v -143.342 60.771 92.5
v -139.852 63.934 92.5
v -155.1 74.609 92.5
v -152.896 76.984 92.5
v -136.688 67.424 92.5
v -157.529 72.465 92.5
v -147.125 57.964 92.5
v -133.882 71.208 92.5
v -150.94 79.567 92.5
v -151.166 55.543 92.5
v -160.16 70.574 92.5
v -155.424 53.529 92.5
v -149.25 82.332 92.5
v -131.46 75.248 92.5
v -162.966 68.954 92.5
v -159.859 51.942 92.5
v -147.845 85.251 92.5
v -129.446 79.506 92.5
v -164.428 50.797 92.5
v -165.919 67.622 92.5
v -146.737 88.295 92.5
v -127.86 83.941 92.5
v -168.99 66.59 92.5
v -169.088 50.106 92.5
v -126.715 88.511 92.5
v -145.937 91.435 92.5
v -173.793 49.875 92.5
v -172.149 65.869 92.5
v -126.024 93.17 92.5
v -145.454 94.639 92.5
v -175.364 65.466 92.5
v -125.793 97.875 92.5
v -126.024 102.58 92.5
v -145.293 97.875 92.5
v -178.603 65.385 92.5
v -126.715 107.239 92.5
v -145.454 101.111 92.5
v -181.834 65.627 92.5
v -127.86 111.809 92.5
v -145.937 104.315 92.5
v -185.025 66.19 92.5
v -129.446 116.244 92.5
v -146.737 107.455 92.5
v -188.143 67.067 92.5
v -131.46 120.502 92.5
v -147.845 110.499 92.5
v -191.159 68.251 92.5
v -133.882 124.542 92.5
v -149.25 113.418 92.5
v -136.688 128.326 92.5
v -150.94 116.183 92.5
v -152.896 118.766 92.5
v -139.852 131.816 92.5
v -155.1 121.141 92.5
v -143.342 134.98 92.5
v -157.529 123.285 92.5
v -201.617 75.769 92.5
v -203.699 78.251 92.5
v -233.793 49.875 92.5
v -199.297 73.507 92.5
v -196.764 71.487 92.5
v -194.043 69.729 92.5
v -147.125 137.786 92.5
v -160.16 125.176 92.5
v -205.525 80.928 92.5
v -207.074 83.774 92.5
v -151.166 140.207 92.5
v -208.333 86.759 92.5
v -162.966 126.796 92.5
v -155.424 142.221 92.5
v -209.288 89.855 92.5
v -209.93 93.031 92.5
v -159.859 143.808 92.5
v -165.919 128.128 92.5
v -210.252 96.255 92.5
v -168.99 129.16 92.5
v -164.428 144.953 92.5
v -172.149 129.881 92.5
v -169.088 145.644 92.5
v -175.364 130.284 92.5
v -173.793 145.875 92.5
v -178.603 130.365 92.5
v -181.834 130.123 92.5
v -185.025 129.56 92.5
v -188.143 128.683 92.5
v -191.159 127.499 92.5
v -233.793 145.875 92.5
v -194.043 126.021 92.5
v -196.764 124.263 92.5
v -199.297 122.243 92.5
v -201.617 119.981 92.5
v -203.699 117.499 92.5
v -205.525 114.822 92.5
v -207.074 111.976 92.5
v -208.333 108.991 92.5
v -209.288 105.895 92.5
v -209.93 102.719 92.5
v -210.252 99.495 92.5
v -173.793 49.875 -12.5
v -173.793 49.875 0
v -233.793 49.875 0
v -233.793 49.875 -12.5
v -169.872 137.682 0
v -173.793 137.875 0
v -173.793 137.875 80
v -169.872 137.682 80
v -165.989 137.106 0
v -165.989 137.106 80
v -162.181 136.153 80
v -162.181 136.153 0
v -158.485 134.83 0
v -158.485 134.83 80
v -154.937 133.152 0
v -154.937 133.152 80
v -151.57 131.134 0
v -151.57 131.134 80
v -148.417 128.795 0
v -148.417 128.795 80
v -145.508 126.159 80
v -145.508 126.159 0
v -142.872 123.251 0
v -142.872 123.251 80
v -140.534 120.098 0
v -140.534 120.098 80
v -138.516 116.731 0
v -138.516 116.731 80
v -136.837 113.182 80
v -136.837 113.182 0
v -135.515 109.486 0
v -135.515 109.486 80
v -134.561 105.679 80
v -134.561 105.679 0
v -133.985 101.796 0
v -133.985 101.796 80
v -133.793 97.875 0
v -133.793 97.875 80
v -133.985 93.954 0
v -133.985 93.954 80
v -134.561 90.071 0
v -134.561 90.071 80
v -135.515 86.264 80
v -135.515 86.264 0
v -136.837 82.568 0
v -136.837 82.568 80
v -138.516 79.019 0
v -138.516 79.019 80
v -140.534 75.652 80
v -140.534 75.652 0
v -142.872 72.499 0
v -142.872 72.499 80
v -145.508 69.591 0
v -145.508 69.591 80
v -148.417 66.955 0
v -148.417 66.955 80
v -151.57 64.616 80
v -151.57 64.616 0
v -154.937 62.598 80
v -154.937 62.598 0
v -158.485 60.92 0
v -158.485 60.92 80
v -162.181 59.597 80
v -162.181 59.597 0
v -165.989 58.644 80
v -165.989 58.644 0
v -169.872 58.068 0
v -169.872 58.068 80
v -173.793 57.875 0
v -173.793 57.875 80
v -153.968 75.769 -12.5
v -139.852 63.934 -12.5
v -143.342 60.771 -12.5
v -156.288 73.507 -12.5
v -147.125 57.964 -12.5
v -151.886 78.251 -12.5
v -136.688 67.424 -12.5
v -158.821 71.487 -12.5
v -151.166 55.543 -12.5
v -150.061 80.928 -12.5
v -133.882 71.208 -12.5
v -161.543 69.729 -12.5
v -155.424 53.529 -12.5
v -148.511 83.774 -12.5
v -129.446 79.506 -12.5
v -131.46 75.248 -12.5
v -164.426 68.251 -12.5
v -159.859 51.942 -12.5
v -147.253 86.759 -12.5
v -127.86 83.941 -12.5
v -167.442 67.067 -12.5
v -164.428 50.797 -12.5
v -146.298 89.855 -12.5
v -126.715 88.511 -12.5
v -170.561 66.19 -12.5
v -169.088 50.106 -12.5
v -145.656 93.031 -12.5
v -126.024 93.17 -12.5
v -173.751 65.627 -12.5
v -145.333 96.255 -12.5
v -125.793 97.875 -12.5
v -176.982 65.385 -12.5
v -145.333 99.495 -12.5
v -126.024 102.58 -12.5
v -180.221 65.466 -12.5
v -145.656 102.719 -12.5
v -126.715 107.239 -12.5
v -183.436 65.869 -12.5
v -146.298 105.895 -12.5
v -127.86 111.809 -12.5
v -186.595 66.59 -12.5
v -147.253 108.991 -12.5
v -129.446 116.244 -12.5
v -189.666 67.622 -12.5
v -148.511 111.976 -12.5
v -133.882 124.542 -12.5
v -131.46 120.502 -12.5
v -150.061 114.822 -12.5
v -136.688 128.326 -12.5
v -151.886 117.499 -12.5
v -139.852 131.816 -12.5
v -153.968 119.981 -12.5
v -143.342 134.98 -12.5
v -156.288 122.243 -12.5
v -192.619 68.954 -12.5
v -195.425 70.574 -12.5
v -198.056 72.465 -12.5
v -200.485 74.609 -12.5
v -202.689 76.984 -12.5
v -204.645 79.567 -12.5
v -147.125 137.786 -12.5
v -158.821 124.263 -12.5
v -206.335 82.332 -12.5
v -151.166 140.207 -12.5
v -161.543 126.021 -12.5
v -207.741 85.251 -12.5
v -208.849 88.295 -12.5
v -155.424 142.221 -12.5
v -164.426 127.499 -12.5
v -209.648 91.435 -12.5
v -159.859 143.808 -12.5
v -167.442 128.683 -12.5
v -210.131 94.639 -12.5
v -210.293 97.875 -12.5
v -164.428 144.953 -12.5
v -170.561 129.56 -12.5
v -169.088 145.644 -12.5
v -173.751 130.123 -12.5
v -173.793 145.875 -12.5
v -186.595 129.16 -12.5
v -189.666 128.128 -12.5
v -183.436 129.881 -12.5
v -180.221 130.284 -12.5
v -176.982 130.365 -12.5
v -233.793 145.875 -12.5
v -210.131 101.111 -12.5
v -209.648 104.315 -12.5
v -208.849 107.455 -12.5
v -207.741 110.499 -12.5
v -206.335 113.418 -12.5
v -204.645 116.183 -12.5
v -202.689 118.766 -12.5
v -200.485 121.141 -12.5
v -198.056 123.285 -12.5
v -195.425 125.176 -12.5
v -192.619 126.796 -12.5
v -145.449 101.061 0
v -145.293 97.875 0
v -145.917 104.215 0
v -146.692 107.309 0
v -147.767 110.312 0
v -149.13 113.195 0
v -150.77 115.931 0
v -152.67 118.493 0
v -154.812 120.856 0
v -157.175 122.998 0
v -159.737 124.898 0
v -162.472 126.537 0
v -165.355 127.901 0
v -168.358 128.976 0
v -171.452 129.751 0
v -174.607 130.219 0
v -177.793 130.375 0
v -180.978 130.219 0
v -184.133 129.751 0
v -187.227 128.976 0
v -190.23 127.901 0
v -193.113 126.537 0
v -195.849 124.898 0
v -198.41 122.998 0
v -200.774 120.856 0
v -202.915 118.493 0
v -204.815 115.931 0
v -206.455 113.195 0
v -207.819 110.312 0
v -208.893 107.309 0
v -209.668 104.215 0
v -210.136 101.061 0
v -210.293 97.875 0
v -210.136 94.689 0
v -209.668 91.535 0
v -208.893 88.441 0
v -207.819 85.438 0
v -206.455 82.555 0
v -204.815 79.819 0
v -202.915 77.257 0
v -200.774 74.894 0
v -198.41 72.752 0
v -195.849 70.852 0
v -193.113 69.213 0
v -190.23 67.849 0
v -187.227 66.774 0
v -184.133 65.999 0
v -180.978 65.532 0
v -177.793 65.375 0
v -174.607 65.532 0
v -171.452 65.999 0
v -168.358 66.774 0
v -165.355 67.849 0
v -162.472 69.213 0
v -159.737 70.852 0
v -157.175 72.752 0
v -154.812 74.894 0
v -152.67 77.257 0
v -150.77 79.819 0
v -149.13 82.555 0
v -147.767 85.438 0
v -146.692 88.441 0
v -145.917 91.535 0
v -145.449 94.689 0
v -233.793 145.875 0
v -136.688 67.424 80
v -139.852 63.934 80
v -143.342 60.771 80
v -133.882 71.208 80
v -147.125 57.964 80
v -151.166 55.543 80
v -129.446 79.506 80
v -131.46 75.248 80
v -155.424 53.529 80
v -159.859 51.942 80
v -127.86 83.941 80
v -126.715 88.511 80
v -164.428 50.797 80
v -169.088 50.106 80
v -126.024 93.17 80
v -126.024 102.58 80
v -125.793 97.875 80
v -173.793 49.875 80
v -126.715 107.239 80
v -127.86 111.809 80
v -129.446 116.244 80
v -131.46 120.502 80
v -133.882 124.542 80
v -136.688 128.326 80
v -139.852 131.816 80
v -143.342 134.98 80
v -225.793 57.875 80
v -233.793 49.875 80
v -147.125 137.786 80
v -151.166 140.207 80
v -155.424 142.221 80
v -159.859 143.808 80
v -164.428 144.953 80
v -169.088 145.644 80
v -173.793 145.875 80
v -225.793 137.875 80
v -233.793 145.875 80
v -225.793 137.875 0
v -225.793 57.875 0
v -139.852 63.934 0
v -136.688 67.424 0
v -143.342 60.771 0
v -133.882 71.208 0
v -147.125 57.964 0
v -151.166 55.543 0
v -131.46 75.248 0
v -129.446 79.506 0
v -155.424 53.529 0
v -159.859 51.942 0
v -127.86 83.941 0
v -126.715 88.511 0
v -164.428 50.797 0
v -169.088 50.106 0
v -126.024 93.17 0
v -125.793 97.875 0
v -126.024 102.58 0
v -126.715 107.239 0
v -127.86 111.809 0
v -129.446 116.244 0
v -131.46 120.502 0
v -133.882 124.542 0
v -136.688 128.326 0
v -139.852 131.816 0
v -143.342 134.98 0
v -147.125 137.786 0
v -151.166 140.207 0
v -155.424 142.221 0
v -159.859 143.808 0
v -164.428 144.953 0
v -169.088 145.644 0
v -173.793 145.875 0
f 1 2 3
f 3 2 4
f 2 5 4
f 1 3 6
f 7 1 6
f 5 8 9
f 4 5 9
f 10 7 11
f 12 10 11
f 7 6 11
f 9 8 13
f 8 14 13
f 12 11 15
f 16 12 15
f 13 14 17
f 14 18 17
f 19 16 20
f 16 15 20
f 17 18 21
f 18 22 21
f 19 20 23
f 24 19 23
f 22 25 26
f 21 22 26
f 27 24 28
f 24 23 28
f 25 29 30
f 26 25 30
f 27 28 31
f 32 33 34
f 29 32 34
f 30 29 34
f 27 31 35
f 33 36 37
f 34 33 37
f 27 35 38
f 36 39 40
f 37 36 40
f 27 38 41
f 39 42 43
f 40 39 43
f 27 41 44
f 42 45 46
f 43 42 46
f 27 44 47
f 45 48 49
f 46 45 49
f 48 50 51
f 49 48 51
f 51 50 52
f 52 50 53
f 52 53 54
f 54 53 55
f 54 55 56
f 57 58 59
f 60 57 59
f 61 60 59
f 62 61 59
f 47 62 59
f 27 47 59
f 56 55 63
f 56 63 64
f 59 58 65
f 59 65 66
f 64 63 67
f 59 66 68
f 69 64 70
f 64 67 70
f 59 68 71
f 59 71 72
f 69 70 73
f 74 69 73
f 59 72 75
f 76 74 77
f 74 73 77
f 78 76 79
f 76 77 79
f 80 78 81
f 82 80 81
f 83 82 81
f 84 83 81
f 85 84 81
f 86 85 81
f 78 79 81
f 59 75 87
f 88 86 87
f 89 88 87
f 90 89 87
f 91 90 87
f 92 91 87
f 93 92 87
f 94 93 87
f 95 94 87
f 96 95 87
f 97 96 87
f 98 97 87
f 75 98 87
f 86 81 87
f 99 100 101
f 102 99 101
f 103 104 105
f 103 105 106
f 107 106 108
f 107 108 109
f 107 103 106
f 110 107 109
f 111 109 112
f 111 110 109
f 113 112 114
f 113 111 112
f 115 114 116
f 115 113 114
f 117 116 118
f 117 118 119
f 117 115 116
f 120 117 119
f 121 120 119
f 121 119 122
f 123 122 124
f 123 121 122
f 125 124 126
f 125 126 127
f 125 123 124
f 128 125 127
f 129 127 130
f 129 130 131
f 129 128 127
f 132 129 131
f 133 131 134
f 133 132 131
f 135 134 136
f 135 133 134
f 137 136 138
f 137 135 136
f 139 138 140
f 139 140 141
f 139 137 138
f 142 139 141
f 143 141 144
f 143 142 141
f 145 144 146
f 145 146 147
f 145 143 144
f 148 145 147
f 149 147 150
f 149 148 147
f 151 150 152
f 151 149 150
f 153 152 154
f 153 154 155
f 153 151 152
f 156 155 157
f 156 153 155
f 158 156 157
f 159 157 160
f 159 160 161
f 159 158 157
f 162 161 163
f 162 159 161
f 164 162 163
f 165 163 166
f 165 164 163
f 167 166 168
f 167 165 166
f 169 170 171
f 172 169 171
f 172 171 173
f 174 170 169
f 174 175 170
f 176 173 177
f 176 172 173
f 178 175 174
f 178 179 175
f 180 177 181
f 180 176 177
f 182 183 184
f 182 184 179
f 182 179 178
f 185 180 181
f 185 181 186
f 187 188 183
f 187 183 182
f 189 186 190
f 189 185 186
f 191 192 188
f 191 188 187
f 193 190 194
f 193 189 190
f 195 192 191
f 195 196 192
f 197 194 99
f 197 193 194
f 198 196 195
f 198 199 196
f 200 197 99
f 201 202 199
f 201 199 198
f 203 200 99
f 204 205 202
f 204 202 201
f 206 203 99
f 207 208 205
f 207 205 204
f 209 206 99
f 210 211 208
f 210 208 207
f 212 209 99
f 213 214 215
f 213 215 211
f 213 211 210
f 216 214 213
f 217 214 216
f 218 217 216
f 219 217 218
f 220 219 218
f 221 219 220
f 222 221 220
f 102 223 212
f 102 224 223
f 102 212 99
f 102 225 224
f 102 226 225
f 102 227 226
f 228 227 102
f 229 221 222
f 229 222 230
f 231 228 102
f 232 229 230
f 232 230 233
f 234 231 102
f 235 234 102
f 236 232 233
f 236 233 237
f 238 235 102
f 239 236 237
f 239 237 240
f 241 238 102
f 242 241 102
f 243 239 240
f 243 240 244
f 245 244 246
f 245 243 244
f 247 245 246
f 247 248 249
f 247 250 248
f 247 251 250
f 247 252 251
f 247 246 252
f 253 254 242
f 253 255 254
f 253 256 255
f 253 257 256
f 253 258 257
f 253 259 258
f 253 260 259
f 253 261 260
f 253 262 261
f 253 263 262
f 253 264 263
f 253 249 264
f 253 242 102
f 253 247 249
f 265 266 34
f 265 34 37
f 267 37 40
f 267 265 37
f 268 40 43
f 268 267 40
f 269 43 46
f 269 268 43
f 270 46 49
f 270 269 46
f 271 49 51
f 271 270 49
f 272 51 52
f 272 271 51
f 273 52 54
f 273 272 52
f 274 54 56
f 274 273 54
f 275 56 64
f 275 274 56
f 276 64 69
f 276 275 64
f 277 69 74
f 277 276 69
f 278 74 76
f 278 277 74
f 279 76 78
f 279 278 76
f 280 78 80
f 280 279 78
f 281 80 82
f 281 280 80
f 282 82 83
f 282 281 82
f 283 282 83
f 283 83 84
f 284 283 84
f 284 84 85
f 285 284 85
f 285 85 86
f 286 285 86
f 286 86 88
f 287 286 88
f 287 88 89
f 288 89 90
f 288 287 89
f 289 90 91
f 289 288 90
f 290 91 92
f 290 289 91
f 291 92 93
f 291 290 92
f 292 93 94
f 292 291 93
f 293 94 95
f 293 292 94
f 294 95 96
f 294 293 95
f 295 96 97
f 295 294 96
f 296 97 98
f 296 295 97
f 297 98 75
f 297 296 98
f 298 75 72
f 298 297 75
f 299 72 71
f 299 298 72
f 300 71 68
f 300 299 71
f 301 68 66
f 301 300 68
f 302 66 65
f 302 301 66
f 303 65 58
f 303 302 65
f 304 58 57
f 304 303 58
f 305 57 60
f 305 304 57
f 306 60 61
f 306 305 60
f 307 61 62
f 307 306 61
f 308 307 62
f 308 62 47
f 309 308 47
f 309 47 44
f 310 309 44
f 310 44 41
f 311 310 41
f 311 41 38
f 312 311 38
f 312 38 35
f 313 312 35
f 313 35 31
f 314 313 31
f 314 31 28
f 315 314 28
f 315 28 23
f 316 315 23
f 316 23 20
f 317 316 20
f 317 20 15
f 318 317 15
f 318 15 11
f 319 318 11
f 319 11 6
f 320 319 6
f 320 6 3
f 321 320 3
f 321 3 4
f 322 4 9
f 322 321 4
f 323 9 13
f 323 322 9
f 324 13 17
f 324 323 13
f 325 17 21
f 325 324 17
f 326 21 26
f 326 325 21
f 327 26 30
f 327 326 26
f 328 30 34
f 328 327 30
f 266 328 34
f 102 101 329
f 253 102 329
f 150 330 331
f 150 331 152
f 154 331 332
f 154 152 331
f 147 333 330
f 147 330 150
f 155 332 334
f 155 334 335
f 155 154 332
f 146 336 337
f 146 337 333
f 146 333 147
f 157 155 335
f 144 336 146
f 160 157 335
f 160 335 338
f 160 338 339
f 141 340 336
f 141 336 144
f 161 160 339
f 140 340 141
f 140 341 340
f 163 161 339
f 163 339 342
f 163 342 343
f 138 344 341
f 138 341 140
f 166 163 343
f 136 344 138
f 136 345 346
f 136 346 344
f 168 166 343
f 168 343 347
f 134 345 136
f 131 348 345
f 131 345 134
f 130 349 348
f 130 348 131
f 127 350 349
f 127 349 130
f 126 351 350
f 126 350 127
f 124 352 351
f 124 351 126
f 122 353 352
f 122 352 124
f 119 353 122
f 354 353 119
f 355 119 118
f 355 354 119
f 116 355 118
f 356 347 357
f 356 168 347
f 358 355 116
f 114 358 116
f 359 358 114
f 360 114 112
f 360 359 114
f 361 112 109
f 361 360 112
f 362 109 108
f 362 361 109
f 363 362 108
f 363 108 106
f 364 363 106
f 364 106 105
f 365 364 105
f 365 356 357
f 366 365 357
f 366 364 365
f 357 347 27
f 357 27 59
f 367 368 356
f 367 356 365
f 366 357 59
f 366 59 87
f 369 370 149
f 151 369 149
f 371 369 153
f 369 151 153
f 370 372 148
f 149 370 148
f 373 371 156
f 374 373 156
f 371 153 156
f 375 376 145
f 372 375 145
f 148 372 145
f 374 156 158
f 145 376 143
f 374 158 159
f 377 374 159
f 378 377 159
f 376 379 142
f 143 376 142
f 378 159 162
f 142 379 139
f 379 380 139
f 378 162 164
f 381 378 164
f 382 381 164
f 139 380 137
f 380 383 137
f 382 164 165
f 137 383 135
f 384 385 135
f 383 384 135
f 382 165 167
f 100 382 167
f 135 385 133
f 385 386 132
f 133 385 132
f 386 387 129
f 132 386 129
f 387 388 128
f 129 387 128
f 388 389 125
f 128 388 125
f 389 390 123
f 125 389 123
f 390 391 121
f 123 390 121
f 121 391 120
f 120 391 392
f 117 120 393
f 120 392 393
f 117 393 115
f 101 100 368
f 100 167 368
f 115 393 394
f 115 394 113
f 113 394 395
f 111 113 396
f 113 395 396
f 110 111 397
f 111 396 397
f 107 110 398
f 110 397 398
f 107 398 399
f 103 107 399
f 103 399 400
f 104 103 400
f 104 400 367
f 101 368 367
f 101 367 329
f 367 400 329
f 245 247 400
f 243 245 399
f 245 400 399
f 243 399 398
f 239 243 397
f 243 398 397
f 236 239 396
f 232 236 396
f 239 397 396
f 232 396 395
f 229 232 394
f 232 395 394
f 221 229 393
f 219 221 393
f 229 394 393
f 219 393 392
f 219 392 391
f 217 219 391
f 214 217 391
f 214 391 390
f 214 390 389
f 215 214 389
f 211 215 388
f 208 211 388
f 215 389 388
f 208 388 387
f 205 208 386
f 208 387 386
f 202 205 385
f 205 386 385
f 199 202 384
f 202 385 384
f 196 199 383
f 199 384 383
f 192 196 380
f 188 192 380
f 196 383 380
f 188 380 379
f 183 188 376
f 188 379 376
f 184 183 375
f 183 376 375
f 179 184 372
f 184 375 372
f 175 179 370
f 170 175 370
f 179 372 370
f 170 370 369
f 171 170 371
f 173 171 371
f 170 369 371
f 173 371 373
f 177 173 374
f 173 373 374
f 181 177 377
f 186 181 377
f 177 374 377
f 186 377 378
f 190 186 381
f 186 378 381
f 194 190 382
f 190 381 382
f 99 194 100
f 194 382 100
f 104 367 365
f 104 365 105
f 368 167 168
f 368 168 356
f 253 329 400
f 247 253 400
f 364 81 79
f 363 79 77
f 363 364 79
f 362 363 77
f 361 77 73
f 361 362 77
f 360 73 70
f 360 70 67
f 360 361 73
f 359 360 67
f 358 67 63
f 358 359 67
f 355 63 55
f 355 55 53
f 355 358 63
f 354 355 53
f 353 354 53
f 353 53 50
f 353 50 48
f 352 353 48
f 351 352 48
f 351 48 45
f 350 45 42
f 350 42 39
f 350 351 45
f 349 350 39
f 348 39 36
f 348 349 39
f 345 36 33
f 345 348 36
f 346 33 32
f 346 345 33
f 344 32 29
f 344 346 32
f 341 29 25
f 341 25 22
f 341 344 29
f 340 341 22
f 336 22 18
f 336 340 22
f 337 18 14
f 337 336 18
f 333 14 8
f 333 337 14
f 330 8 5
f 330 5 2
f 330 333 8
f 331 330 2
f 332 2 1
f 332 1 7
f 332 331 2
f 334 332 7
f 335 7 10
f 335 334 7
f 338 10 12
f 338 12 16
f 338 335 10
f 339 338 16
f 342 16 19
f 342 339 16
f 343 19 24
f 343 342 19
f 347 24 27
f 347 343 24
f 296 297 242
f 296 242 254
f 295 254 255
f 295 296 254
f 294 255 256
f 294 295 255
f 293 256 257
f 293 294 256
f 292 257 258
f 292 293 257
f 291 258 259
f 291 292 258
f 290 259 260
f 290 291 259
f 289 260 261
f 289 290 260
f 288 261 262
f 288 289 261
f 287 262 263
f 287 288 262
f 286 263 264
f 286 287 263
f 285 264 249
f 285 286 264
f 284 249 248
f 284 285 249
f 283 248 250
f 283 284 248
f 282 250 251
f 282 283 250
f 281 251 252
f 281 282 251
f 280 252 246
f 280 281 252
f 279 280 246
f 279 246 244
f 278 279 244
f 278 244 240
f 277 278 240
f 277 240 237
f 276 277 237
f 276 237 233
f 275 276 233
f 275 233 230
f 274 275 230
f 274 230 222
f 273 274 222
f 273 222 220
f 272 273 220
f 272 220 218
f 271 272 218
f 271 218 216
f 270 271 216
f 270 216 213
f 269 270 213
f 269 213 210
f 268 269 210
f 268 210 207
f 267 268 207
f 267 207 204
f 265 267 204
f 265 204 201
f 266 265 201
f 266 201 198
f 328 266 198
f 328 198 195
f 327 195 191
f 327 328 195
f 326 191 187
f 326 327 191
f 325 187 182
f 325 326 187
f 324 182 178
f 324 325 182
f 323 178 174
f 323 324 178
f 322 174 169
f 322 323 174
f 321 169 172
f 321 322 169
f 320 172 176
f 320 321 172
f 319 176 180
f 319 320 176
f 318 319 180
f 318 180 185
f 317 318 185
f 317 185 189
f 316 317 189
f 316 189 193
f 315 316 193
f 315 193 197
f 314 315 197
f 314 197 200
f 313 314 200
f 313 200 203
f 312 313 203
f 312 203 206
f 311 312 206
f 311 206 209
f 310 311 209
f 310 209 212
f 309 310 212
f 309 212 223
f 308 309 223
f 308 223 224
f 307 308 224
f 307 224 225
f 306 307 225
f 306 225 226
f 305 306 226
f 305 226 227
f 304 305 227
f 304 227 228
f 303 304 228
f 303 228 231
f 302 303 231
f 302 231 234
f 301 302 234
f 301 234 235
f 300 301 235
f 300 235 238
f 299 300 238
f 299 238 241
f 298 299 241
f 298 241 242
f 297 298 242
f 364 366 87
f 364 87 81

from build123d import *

# Parameters (mm, degrees)
SKETCH1_R           = 32.5
BOSS_EXTRUDE1_DEPTH = 80
SKETCH2_R           = 32.5
BOSS_EXTRUDE2_DEPTH = 12.5
SKETCH6_R           = 32.5
BOSS_EXTRUDE4_DEPTH = 12.5


with BuildPart() as part:
    # Sketch1 → Boss-Extrude1 (new body)
    with BuildSketch(Plane.XY):
        with BuildLine():
            Line((-225.792643224, 137.875019839), (-173.792643224, 137.875019839))
            ThreePointArc((-173.792643224, 137.875019839), (-133.792643224, 97.875019839), (-173.792643224, 57.875019839))
            Line((-173.792643224, 57.875019839), (-225.792643224, 57.875019839))
            Line((-225.792643224, 57.875019839), (-225.792643224, 137.875019839))
        make_face()
        with Locations((-177.792643224, 97.875019839)):
            Circle(SKETCH1_R, mode=Mode.SUBTRACT)
    extrude(amount=BOSS_EXTRUDE1_DEPTH)

    # Sketch2 → Boss-Extrude2 (add)
    with BuildSketch(Plane.XY.offset(80)):
        with BuildLine():
            Line((-173.792643224, 49.875019839), (-233.792643224, 49.875019839))
            Line((-233.792643224, 49.875019839), (-233.792643224, 145.875019839))
            Line((-233.792643224, 145.875019839), (-173.792643224, 145.875019839))
            ThreePointArc((-173.792643224, 145.875019839), (-125.792643224, 97.875019839), (-173.792643224, 49.875019839))
        make_face()
        with BuildLine():
            Line((-225.792643224, 137.875019839), (-225.792643224, 57.875019839))
            Line((-225.792643224, 57.875019839), (-173.792643224, 57.875019839))
            ThreePointArc((-173.792643224, 57.875019839), (-133.792643224, 97.875019839), (-173.792643224, 137.875019839))
            Line((-173.792643224, 137.875019839), (-225.792643224, 137.875019839))
        make_face(mode=Mode.SUBTRACT)
        with BuildLine():
            Line((-173.792643224, 137.875019839), (-225.792643224, 137.875019839))
            Line((-225.792643224, 137.875019839), (-225.792643224, 57.875019839))
            Line((-225.792643224, 57.875019839), (-173.792643224, 57.875019839))
            ThreePointArc((-173.792643224, 57.875019839), (-133.792643224, 97.875019839), (-173.792643224, 137.875019839))
        make_face()
        with Locations((-177.792643224, 97.875019839)):
            Circle(SKETCH2_R, mode=Mode.SUBTRACT)
    extrude(amount=BOSS_EXTRUDE2_DEPTH)

    # Sketch6 → Boss-Extrude4 (add)
    with BuildSketch(Plane(origin=(0, 0, 0), x_dir=(-1, 0, 0), z_dir=(0, 0, -1))):
        with BuildLine():
            Line((233.792643224, 145.875019839), (173.792643224, 145.875019839))
            ThreePointArc((173.792643224, 145.875019839), (125.792643224, 97.875019839), (173.792643224, 49.875019839))
            Line((173.792643224, 49.875019839), (233.792643224, 49.875019839))
            Line((233.792643224, 49.875019839), (233.792643224, 145.875019839))
        make_face()
        with Locations((177.792643224, 97.875019839)):
            Circle(SKETCH6_R, mode=Mode.SUBTRACT)
    extrude(amount=BOSS_EXTRUDE4_DEPTH)


solid = part.part
